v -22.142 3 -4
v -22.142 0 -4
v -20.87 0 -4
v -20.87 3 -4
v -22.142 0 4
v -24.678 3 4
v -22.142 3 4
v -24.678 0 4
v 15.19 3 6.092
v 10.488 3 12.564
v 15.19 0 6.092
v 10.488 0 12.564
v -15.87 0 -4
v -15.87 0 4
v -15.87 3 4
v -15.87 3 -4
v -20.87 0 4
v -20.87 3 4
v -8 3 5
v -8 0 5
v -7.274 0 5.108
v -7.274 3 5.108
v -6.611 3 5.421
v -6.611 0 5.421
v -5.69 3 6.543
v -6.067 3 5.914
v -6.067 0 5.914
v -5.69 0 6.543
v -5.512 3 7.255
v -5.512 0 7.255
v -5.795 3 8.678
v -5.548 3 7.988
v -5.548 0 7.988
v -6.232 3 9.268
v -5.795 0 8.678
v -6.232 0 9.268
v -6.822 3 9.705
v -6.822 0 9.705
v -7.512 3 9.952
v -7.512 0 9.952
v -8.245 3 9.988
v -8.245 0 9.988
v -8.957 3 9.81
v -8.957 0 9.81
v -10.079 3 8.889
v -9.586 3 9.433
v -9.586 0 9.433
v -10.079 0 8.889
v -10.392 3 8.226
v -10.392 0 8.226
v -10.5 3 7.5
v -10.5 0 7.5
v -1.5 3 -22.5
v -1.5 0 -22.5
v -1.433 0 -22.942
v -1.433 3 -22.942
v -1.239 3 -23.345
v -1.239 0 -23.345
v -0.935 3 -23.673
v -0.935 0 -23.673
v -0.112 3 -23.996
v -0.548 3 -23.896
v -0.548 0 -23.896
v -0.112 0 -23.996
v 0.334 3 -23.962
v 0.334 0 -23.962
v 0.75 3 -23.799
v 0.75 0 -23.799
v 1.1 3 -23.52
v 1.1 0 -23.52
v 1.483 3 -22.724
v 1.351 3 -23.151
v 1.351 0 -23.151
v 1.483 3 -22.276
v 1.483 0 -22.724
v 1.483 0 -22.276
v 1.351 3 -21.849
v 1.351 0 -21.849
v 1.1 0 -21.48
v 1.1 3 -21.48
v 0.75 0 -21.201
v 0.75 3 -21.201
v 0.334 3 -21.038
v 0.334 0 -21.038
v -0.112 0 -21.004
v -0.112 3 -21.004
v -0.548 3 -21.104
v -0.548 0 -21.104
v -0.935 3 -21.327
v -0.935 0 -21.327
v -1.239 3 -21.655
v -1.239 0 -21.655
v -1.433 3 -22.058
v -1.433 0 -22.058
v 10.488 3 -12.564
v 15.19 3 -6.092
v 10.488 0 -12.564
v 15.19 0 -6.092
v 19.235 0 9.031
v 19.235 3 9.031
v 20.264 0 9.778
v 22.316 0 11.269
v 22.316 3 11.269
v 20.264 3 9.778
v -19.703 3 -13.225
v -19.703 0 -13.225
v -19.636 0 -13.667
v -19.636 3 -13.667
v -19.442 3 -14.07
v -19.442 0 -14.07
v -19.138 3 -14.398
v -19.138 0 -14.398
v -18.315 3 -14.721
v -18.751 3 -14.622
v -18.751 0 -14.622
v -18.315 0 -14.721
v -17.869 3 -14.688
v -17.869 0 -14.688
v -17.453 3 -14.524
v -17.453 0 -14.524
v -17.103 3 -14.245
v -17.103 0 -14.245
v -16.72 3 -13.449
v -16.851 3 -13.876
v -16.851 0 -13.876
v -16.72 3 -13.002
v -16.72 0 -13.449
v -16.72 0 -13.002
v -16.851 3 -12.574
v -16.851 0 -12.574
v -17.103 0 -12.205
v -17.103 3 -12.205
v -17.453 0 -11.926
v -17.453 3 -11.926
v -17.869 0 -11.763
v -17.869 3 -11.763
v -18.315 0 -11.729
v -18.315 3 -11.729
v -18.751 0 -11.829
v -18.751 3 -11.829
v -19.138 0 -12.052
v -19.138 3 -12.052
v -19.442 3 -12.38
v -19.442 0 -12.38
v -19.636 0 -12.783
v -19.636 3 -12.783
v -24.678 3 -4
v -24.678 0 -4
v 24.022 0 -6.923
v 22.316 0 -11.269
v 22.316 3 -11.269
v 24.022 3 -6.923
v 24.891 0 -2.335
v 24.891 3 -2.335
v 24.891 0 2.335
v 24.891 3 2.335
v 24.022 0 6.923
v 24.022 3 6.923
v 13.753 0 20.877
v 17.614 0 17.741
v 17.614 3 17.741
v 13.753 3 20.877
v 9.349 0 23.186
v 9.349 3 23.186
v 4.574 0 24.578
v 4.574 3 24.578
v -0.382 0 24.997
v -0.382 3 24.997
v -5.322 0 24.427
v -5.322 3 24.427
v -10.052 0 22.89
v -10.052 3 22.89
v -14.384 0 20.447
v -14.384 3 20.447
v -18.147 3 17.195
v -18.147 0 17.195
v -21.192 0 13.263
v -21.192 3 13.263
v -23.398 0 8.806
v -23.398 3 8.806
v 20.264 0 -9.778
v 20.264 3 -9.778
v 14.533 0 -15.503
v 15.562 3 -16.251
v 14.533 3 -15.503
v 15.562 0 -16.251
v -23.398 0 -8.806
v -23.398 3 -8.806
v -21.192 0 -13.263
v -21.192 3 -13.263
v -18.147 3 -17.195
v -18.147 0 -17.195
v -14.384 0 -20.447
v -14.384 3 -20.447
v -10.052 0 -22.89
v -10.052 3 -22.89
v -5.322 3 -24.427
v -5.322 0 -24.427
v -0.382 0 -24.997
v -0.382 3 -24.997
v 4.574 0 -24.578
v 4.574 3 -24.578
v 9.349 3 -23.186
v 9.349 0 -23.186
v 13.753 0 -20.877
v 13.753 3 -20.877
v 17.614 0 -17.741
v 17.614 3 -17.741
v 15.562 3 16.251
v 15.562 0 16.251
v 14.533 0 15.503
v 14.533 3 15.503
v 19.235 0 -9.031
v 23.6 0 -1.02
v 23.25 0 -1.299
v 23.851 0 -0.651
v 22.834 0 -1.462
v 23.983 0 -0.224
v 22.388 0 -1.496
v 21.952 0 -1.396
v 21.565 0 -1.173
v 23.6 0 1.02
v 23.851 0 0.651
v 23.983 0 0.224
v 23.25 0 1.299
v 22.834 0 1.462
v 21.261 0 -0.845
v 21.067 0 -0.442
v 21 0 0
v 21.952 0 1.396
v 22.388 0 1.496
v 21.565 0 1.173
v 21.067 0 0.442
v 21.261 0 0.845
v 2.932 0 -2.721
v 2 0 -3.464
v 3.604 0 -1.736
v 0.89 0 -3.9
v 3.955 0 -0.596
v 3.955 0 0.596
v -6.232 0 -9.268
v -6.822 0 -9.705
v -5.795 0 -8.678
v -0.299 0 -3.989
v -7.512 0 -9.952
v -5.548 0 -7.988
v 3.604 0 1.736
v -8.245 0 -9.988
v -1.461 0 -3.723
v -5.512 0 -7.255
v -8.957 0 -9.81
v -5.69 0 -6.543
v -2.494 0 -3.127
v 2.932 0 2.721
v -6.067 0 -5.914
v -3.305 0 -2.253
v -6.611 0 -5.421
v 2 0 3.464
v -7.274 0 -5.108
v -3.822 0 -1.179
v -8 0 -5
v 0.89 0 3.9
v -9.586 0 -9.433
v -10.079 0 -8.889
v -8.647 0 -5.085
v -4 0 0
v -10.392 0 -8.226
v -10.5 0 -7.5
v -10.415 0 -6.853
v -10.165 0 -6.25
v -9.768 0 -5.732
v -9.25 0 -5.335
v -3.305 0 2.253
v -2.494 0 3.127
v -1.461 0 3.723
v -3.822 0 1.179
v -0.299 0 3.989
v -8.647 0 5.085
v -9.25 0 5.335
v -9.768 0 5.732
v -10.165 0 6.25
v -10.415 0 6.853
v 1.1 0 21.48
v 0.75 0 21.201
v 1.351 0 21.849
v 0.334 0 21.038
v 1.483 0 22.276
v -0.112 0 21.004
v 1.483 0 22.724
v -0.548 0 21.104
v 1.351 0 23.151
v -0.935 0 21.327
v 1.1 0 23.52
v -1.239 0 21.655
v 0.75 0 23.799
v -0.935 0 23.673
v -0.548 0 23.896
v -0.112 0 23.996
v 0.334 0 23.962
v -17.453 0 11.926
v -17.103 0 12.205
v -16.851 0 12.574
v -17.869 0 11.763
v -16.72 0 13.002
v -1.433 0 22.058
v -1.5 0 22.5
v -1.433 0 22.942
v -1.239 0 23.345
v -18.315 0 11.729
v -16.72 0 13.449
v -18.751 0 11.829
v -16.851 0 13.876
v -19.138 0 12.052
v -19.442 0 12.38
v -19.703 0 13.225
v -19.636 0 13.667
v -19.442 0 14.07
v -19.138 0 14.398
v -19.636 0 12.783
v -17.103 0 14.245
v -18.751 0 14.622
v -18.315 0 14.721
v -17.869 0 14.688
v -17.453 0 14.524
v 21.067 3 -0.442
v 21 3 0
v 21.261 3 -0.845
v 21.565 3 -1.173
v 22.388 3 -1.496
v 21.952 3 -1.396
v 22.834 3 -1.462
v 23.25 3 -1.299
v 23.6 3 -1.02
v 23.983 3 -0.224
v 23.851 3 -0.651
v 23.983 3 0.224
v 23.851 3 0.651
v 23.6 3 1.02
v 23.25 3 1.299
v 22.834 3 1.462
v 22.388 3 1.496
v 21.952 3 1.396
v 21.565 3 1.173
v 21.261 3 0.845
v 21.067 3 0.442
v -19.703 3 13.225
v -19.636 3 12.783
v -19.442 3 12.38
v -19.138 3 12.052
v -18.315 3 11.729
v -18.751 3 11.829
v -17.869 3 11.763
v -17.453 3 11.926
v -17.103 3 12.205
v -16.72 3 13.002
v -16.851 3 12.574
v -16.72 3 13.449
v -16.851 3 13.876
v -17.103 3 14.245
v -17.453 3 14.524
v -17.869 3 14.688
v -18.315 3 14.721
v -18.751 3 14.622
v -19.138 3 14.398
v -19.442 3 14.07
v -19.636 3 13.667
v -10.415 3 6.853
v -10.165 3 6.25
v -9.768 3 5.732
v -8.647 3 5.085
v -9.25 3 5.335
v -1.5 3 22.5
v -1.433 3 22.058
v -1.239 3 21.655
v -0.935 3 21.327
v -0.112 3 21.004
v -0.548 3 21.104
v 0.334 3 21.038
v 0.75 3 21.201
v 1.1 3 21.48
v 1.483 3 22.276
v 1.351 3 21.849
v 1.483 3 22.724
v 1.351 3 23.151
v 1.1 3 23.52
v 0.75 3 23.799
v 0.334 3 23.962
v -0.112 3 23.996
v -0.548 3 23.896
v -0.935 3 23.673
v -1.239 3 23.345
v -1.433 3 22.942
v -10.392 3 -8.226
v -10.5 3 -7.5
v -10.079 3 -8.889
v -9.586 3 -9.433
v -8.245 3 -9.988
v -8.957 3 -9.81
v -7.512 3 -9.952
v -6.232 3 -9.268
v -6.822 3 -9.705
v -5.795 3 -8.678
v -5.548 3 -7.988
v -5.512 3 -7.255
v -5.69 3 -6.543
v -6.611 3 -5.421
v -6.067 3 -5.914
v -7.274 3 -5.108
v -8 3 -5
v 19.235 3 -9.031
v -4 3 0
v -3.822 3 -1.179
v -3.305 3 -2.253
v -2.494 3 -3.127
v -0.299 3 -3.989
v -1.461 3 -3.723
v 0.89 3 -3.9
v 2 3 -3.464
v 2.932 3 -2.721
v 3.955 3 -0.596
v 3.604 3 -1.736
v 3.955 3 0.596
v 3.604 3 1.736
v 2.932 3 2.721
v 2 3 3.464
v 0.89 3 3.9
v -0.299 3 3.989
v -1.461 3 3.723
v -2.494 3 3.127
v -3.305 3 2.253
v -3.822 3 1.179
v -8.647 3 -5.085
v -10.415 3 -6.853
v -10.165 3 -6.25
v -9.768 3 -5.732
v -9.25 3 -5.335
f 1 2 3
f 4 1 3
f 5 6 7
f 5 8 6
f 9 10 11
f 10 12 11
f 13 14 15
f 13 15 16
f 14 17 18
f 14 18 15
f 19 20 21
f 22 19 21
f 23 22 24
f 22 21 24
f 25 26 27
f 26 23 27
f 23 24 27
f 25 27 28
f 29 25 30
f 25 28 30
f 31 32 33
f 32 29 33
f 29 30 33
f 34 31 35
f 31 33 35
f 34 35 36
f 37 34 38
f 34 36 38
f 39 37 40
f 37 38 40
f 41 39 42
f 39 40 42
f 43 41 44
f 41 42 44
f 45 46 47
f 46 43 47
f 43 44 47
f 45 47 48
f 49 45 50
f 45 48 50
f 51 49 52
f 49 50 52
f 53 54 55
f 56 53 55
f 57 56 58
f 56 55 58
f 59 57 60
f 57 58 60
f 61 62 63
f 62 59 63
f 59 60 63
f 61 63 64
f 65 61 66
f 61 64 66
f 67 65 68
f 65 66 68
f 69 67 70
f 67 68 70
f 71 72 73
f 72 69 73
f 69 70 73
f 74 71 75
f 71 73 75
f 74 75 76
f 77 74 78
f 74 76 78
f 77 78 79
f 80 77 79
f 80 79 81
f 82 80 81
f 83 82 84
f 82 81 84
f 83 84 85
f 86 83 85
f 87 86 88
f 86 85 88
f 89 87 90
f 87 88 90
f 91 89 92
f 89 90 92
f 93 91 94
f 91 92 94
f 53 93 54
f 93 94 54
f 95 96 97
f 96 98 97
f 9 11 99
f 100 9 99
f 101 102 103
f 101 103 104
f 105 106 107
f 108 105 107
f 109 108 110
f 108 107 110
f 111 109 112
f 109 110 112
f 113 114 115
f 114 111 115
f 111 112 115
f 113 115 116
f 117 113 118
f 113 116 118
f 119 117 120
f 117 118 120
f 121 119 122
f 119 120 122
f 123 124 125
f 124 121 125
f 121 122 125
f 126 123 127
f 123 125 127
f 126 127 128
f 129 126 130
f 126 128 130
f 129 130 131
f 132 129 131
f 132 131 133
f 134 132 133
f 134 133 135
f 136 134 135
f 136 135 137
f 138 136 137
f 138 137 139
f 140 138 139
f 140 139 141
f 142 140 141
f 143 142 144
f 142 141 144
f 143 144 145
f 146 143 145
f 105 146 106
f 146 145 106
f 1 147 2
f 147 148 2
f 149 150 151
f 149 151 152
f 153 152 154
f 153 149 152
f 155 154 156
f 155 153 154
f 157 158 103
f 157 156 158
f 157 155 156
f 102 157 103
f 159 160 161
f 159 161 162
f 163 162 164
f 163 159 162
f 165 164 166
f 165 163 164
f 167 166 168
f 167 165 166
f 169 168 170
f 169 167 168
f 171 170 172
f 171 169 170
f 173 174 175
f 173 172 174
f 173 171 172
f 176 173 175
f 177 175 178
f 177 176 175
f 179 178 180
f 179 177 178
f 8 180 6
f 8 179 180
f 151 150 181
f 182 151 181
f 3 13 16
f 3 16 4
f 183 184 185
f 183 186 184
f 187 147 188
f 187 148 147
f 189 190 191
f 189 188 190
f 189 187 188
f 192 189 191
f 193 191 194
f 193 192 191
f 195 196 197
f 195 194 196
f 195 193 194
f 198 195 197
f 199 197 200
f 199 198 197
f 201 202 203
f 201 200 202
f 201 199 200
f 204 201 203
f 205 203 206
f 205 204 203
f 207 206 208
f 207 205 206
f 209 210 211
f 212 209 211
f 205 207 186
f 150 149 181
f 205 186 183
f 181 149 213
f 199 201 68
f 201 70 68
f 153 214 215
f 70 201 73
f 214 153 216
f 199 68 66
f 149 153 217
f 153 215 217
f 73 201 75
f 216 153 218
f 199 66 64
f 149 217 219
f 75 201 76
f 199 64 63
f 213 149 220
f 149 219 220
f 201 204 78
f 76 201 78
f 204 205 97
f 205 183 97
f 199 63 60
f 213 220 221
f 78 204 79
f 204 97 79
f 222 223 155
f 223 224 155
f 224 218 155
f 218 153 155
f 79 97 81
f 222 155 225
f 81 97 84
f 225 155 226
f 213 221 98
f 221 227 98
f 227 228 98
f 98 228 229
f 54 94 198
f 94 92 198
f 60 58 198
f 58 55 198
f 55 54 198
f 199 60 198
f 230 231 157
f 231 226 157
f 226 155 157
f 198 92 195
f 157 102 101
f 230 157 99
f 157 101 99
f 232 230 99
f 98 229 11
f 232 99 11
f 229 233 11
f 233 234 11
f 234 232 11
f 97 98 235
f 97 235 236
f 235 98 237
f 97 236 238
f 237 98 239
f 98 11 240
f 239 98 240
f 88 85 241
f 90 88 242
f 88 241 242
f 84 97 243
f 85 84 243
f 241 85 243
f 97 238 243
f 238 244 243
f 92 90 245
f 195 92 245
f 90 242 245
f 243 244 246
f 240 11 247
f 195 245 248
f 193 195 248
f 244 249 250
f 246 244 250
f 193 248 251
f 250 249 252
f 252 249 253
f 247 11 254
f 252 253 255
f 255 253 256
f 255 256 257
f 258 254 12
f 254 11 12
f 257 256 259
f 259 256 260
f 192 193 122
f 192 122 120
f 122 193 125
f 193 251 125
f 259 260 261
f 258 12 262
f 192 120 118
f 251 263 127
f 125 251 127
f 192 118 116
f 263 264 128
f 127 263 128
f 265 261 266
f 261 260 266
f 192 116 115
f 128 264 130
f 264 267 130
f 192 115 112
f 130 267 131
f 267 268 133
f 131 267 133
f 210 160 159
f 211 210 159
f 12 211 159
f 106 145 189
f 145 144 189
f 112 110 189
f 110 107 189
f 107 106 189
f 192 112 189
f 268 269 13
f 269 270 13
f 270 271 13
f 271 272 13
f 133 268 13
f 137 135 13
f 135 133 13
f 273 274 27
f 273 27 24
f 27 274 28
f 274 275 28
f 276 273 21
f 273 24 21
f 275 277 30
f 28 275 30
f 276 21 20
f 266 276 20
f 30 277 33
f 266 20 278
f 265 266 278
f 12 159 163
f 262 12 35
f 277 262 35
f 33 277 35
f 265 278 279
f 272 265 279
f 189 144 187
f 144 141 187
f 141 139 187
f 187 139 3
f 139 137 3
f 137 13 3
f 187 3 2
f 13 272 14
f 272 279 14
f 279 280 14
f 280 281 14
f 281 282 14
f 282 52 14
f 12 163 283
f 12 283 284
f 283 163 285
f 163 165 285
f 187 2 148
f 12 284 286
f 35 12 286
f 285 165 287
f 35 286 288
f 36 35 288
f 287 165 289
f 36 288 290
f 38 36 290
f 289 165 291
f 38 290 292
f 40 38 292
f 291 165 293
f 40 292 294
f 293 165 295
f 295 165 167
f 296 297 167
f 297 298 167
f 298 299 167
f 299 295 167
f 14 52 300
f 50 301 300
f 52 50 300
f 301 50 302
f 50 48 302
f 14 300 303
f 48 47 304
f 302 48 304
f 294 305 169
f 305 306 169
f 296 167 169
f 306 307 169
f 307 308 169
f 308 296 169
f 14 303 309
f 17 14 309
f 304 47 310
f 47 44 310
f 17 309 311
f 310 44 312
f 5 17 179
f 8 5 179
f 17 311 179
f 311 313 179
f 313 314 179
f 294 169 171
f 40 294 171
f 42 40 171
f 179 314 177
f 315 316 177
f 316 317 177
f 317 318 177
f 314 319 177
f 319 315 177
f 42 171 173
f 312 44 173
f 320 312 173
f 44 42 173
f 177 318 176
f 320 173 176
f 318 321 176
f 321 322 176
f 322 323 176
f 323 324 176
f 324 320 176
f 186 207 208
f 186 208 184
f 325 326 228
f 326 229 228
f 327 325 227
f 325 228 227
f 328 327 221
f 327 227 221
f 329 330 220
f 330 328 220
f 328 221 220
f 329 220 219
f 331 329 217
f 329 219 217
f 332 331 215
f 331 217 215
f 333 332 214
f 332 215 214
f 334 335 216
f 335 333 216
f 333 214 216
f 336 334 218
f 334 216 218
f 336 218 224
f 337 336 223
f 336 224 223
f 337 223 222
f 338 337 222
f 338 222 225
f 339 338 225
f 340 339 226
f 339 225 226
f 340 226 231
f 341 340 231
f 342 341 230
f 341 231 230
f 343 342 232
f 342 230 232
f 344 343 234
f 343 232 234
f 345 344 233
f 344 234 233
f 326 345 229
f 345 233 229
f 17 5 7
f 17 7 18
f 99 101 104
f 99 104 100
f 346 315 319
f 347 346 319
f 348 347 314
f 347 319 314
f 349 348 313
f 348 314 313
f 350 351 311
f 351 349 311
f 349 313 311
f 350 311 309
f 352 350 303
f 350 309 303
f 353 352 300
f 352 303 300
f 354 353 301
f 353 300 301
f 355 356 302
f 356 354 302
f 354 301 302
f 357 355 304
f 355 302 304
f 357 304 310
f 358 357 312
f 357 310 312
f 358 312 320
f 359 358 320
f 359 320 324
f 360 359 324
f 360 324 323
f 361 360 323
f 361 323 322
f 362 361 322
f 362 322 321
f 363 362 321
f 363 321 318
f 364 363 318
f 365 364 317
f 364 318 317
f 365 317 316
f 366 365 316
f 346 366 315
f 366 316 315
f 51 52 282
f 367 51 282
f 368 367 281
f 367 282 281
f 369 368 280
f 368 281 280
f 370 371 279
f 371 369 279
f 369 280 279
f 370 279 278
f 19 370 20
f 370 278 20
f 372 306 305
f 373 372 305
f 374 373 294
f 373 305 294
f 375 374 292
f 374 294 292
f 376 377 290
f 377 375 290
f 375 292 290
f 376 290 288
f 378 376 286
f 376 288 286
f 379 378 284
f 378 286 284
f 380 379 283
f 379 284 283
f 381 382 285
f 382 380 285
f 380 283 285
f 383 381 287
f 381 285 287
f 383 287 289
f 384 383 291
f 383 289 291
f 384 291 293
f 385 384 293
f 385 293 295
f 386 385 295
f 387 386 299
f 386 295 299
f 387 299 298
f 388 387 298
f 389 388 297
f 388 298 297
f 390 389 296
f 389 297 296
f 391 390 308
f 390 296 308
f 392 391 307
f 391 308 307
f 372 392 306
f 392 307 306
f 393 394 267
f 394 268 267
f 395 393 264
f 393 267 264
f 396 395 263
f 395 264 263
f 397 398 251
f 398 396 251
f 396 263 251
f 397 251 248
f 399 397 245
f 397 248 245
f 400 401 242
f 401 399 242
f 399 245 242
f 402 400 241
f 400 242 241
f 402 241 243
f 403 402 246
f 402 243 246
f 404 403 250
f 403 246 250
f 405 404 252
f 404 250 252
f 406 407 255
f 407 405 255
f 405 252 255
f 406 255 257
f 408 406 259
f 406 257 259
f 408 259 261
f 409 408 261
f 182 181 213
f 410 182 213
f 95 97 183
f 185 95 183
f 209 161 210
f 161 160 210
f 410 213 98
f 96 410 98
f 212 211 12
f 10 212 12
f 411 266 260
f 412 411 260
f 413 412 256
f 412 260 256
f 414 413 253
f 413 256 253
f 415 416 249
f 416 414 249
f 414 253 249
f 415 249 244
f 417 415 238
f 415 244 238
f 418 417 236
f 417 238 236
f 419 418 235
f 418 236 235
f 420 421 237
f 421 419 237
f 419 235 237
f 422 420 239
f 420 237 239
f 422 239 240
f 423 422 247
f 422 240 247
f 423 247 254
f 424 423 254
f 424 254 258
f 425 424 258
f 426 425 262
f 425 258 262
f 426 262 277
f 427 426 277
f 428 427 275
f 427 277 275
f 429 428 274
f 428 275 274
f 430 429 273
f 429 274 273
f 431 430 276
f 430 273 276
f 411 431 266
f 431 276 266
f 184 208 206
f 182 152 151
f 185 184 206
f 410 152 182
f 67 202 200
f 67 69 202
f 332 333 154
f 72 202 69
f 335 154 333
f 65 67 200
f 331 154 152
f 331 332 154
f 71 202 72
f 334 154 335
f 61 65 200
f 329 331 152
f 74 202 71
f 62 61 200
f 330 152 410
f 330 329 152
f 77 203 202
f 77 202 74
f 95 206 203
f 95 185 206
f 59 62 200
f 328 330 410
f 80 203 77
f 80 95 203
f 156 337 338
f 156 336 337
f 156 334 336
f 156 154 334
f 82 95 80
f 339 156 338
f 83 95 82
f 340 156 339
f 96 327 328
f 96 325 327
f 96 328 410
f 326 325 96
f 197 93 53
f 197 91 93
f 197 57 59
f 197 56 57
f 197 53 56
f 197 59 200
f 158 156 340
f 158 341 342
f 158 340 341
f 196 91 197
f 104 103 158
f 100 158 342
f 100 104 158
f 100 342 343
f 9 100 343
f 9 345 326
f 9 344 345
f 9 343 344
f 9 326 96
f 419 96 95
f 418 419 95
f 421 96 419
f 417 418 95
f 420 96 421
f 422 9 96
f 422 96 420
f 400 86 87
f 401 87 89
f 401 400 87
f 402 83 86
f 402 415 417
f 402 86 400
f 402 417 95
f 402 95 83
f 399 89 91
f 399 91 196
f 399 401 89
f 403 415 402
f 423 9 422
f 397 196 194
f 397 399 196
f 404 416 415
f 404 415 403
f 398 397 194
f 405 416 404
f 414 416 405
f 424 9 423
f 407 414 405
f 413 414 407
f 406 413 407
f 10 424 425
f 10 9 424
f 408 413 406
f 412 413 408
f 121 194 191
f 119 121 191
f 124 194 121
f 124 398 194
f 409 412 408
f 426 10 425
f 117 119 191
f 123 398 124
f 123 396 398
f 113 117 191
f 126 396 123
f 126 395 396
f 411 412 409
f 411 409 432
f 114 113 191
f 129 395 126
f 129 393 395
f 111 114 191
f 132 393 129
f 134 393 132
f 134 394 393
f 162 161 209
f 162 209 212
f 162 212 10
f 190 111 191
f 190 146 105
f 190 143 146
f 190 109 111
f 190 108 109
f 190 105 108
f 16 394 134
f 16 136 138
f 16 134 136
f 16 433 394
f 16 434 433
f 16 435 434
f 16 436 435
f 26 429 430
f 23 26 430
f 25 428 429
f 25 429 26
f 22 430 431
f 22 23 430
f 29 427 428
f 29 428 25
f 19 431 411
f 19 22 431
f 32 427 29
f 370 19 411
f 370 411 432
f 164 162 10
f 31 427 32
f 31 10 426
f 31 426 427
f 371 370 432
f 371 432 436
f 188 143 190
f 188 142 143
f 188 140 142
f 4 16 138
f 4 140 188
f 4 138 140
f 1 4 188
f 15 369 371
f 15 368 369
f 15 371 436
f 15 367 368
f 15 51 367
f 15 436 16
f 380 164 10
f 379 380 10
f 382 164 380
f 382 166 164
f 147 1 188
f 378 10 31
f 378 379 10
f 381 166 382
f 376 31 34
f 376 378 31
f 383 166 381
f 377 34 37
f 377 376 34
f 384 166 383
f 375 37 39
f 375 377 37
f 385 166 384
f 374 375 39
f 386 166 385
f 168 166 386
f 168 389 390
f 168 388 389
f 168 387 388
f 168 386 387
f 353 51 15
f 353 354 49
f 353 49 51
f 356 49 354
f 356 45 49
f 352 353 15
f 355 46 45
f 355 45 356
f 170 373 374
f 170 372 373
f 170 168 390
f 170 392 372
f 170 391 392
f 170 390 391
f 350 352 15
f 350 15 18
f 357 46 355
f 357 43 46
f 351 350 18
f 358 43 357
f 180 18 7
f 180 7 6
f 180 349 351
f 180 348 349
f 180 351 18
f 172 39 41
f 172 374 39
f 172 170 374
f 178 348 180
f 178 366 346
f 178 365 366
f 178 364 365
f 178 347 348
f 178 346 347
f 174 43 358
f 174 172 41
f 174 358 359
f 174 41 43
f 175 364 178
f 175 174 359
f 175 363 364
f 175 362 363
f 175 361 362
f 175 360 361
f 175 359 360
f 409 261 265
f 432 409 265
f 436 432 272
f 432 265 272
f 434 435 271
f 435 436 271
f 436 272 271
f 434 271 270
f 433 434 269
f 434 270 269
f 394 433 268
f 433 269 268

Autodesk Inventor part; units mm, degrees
ref_plane "YZ Plane" through (0, 0, 0) normal (1, 0, 0) x (0, 1, 0)
ref_plane "XZ Plane" through (0, 0, 0) normal (0, 1, 0) x (-1, 0, 0)
ref_plane "XY Plane" through (0, 0, 0) normal (0, 0, 1) x (1, 0, 0)
sketch "Sketch1" plane through (0, 0, 0) normal (0, 1, 0) x (-1, 0, 0)
  line L0 (-17.6137, 17.7414) -> (-15.5618, 16.2506)
  line L1 (-23.5374, 22.0452) -> (-13.679, 22.0452) construction
  line L2 (-22.316, 11.2693) -> (-20.2641, 9.7784)
  line L3 (-22.316, -11.2693) -> (-20.2641, -9.7784)
  line L4 (-17.6137, -17.7414) -> (-15.5618, -16.2506)
  line L5 (24.6779, 4) -> (22.1416, 4)
  line L6 (24.6779, -4) -> (22.1416, -4)
  line L7 (-20.2641, -9.7784) -> (-19.2354, -9.0311)
  line L8 (-15.5618, -16.2506) -> (-14.5332, -15.5032)
  line L9 (-20.2641, 9.7784) -> (-19.2354, 9.0311)
  line L10 (-15.5618, 16.2506) -> (-14.5332, 15.5032)
  line L11 (22.1416, 4) -> (20.8701, 4)
  line L12 (22.1416, -4) -> (20.8701, -4)
  arc A0 (-17.6137, -17.7414) -> (24.6779, -4) centre (0, 0) ccw
  arc A1 (24.6779, 4) -> (-17.6137, 17.7414) centre (0, 0) ccw
  arc A2 (-22.316, 11.2693) -> (-22.316, -11.2693) centre (0, 0) ccw
  line L13 (20.8701, 4) -> (15.8701, 4)
  line L14 (15.8701, 4) -> (15.8701, -4)
  line L15 (15.8701, -4) -> (20.8701, -4)
  line L16 (-14.5332, 15.5032) -> (-10.4881, 12.5643)
  line L17 (-10.4881, 12.5643) -> (-15.1903, 6.0922)
  line L18 (-15.1903, 6.0922) -> (-19.2354, 9.0311)
  line L19 (-19.2354, -9.0311) -> (-15.1903, -6.0922)
  line L20 (-15.1903, -6.0922) -> (-10.4881, -12.5643)
  line L21 (-10.4881, -12.5643) -> (-14.5332, -15.5032)
  circle A3 centre (-22.5, 0) radius 1.5
  circle A4 centre (0, 22.5) radius 1.5
  circle A5 centre (18.2029, 13.2252) radius 1.5
  circle A6 centre (18.2029, -13.2252) radius 1.5
  circle A7 centre (0, -22.5) radius 1.5
  circle A8 centre (0, 0) radius 4
  line L22 (0, 0) -> (8, 0)
  line L23 (8, 0) -> (8, 7.5)
  line L24 (8, 0) -> (8, -7.5)
  circle A9 centre (8, -7.5) radius 2.5
  circle A10 centre (8, 7.5) radius 2.5
  point P0 (-28.2397, -15.5731)
  point P1 (-23.5374, -22.0452)
  point P2 (32, -4)
  dimension "d1" = 36
  dimension "d3" = 5
  dimension "d4" = 5
  dimension "d6" = 3
  dimension "d7" = 3
  dimension "d8" = 3
  dimension "d9" = 3
  dimension "d10" = 3
  dimension "d13" = 8
  dimension "d14" = 8
  dimension "d15" = 7.5
  dimension "d16" = 7.5
  dimension "d17" = 5
  dimension "d18" = 5
extrude "Extrusion2" add sketch "Sketch1" along normal blind 3
properties part number "actuatorMountingPlate"
